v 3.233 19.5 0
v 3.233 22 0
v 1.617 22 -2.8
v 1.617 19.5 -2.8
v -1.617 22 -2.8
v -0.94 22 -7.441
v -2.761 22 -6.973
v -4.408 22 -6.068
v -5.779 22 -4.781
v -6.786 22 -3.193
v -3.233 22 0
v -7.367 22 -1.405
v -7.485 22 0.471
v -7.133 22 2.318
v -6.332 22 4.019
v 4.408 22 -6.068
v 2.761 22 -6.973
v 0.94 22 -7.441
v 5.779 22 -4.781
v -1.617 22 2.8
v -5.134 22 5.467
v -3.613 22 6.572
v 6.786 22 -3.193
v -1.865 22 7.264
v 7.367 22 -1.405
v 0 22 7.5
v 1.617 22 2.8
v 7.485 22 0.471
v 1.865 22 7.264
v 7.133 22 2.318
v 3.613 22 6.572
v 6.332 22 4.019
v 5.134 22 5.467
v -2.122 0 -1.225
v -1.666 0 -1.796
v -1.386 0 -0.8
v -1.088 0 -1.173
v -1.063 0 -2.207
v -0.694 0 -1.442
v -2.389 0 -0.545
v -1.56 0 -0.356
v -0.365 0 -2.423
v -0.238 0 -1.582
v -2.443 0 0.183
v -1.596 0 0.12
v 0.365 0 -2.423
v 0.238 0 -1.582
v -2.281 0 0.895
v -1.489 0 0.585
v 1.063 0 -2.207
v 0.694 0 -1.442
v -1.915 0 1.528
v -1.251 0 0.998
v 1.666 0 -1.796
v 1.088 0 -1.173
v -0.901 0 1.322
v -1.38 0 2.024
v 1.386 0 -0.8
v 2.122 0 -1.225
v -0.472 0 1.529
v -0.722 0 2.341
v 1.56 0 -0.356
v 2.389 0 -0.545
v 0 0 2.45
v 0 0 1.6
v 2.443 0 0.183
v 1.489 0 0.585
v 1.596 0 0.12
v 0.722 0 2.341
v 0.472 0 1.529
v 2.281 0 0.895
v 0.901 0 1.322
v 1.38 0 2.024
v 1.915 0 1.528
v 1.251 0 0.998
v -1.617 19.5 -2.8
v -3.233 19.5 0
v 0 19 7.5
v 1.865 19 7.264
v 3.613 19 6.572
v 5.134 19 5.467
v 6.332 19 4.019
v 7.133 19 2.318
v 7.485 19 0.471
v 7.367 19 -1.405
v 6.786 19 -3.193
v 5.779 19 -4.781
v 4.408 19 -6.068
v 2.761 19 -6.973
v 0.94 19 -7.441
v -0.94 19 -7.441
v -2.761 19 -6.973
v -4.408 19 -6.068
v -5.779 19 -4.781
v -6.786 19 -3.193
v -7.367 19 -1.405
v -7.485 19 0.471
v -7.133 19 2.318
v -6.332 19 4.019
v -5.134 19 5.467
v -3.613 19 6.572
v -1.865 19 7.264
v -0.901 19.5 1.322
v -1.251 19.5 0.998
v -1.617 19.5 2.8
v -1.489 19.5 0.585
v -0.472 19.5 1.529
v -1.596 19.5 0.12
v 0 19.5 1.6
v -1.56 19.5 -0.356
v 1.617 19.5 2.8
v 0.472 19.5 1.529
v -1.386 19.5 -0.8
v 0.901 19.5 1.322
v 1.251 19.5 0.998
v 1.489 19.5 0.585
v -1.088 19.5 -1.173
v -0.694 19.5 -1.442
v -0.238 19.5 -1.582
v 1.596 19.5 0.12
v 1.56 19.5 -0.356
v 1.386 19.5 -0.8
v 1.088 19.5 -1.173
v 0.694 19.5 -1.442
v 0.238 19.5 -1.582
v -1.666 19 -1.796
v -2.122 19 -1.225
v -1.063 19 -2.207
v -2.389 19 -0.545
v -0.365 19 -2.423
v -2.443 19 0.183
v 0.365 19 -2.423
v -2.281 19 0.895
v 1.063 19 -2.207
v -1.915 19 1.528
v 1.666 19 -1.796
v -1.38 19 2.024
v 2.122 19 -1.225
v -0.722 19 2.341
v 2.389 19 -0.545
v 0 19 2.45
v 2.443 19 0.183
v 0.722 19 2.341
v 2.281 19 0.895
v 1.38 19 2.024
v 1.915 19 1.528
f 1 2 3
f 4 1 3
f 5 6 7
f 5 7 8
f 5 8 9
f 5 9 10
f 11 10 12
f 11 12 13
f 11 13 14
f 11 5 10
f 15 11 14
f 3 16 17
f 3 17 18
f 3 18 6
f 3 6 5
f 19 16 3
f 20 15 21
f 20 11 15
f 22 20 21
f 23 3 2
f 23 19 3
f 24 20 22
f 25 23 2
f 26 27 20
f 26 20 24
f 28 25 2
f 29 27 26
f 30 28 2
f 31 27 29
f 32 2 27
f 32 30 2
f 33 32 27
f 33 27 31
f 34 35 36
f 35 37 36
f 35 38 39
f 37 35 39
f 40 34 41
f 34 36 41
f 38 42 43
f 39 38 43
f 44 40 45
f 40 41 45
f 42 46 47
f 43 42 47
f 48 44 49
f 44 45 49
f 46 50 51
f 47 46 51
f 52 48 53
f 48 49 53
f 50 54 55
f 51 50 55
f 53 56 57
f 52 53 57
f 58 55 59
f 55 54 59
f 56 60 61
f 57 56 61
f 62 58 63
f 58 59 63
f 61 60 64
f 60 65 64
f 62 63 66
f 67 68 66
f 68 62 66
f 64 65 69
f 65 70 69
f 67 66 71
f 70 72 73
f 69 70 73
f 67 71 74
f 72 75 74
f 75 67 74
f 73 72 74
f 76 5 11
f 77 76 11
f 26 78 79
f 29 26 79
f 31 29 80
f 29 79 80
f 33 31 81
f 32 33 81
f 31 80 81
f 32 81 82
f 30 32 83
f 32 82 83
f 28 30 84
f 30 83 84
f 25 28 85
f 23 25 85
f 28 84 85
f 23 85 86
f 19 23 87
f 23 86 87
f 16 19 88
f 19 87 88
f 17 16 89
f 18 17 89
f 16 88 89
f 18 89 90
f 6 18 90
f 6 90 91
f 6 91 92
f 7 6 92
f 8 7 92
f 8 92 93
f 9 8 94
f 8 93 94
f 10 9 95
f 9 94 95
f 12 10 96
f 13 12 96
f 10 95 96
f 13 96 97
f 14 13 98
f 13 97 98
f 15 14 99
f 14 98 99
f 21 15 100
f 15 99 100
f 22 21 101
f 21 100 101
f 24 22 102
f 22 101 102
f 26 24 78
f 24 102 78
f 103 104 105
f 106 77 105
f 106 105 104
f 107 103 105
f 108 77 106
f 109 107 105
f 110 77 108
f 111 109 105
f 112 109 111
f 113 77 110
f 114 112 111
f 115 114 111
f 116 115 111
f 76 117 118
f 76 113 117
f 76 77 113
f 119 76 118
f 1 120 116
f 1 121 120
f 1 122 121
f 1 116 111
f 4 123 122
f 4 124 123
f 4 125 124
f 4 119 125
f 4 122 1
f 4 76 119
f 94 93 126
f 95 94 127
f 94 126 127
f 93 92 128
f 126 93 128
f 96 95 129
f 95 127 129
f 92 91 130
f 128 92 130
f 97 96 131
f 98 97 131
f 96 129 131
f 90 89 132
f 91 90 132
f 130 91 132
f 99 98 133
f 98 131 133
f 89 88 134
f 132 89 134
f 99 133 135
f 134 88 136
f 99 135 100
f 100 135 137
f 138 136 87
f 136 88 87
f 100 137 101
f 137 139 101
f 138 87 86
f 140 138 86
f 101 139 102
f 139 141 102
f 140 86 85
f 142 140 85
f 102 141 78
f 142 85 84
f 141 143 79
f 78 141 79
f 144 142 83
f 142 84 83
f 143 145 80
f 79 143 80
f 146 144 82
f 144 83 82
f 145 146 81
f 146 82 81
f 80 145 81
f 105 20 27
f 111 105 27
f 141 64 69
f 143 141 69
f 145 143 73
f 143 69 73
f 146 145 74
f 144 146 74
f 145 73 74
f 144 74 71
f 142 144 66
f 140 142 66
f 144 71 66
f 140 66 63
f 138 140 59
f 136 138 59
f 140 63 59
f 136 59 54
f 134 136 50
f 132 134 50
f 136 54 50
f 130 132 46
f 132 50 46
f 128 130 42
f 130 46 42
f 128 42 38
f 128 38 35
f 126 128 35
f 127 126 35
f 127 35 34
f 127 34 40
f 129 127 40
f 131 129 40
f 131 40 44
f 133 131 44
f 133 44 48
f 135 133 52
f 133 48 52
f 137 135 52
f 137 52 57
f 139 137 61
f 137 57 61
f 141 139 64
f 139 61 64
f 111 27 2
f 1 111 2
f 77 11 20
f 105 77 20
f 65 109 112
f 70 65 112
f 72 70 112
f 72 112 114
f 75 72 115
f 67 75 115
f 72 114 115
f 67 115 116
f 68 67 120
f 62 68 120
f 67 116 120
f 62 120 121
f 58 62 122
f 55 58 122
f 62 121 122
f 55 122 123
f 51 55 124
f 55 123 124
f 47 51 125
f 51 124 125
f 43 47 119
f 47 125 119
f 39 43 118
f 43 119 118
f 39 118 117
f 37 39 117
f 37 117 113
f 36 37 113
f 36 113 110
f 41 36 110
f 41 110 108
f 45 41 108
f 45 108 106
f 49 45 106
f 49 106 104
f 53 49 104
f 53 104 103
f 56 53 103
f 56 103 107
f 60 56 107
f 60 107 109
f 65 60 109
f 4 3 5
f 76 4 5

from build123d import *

# Parameters (mm, degrees)
SKETCH1_R           = 2.45
SKETCH1_R_2         = 1.6
BOSS_EXTRUDE1_DEPTH = 19
SKETCH2_R           = 7.5
BOSS_EXTRUDE2_DEPTH = 3
CUT_EXTRUDE1_REACH  = 26.423
SKETCH3_R           = 1.6
CUT_EXTRUDE2_DEPTH  = 2.5


with BuildPart() as part:
    # Sketch1 → Boss-Extrude1 (new body)
    with BuildSketch(Plane(origin=(0, 0, 0), x_dir=(1, 0, 0), z_dir=(0, 1, 0))):
        with Locations(Location((0, 0, 0), (0, 0, 270))):
            Circle(SKETCH1_R)
        with Locations(Location((0, 0, 0), (0, 0, 270))):
            Circle(SKETCH1_R_2, mode=Mode.SUBTRACT)
    extrude(amount=BOSS_EXTRUDE1_DEPTH)

    # Sketch2 → Boss-Extrude2 (add)
    with BuildSketch(Plane(origin=(0, 19, 0), x_dir=(1, 0, 0), z_dir=(0, 1, 0))):
        with Locations(Location((0, 0, 0), (0, 0, 270))):
            Circle(SKETCH2_R)
    extrude(amount=BOSS_EXTRUDE2_DEPTH)

    # Sketch3 → Cut-Extrude1 (cut, up to next)
    with BuildSketch(Plane(origin=(0, 22, 0), x_dir=(1, 0, 0), z_dir=(0, 1, 0)), mode=Mode.PRIVATE) as cut_extrude1_sk1:
        with Locations(Location((0, 0, 0), (0, 0, 270))):
            Circle(SKETCH3_R)
    cut_extrude1_tool1 = extrude(cut_extrude1_sk1.sketch, amount=-CUT_EXTRUDE1_REACH, mode=Mode.PRIVATE) & part.part
    add(cut_extrude1_tool1.solids().sort_by_distance((0, 22, 0))[0], mode=Mode.SUBTRACT)

    # Sketch4 → Cut-Extrude2 (cut)
    with BuildSketch(Plane(origin=(0, 22, 0), x_dir=(1, 0, 0), z_dir=(0, 1, 0))):
        Polygon((3.233161507, 0), (1.616580754, 2.8), (-1.616580754, 2.8), (-3.233161507, 0), (-1.616580754, -2.8), (1.616580754, -2.8), align=None)
    extrude(amount=-CUT_EXTRUDE2_DEPTH, mode=Mode.SUBTRACT)


solid = part.part
